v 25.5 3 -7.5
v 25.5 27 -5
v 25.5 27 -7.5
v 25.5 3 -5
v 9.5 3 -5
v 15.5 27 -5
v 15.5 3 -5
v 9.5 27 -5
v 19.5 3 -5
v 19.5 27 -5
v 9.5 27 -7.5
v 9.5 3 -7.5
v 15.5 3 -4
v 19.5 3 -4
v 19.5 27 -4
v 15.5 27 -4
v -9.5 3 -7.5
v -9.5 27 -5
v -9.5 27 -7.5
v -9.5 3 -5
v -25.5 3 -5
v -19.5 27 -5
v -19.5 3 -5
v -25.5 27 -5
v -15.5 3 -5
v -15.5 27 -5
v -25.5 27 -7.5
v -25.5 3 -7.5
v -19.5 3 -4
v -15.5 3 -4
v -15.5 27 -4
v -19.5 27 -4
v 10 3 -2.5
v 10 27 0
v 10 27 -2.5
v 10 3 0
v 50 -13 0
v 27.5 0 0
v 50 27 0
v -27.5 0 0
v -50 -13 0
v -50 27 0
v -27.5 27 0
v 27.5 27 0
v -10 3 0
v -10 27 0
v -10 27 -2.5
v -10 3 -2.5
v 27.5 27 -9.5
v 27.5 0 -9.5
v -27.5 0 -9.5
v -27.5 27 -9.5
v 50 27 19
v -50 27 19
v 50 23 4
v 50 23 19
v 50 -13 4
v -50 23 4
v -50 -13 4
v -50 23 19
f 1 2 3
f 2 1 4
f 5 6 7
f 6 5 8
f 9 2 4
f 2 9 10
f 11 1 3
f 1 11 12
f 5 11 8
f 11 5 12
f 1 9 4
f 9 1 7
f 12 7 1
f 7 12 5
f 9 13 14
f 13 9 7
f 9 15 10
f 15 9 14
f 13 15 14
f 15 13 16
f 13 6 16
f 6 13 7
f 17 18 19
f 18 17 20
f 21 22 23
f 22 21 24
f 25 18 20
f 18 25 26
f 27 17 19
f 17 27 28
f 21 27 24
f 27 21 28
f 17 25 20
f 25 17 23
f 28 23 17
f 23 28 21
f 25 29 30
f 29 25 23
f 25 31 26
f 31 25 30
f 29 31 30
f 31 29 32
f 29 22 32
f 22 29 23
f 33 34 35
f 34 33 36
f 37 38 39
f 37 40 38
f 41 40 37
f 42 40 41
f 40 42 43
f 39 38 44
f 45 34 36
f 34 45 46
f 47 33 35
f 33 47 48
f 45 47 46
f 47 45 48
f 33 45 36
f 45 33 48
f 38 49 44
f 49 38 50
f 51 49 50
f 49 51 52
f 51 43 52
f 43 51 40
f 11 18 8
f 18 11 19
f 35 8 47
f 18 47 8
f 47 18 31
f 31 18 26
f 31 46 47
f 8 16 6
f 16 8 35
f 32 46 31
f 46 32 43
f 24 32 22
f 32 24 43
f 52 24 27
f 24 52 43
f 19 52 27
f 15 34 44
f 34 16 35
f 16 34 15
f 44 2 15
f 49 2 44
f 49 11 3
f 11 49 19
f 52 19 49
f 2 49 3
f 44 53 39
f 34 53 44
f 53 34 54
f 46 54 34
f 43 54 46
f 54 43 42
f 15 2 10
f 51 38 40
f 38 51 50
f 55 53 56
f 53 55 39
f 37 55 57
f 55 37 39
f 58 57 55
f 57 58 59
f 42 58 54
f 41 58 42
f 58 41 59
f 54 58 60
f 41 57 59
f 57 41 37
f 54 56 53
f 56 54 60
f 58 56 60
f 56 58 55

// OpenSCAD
// file: common.scad
module ccube(dims) {
    translate([-dims[0]/2, -dims[1]/2, 0]) cube(dims);
}
// main file
include <common.scad>

tab_thickness = 2.5;
tab_middle_width = 20;
tab_middle_dz = tab_thickness + 2.5;
tab_side_width = 16;
tab_side_spacing = 19;
tab_depth = 25;
dot_thickness = 1;
dot_width = 4;
tab_width = 2 * tab_side_width + tab_side_spacing;

module tab_side() {
    ccube([tab_side_width, tab_depth, tab_thickness]);
    translate([0, 0, tab_thickness])
        ccube([dot_width, tab_depth, dot_thickness]);
}

module tabs() {
    translate([(tab_side_width + tab_side_spacing)/2, 0, 0])
        tab_side();
    translate([-(tab_side_width + tab_side_spacing)/2, 0, 0])
        tab_side();
    translate([0, 0, tab_middle_dz])
        ccube([tab_middle_width, tab_depth, tab_thickness]);
}

connector_x = 2 * (2 + tab_side_width) + tab_side_spacing;
connector_y = 2 + tab_depth;
connector_z = tab_thickness + tab_middle_dz + 4;

module connector() {
    difference() {
        ccube([connector_x, connector_y, connector_z]);
        translate([0, connector_y - tab_depth, 2]) tabs();
    }
}

translate([0, connector_y / 2, -connector_z + 2])
    connector();

base_x = 100;
base_y = 40;
base_z = 4;

lip_x = base_x;
lip_y = 4;
lip_z = 15;

translate([0, connector_y - base_y/2, 0]) {
    ccube([base_x, base_y , base_z]);
    translate([0, base_y/2 - lip_y/2, base_z])
        ccube([lip_x, lip_y, lip_z]);
}
